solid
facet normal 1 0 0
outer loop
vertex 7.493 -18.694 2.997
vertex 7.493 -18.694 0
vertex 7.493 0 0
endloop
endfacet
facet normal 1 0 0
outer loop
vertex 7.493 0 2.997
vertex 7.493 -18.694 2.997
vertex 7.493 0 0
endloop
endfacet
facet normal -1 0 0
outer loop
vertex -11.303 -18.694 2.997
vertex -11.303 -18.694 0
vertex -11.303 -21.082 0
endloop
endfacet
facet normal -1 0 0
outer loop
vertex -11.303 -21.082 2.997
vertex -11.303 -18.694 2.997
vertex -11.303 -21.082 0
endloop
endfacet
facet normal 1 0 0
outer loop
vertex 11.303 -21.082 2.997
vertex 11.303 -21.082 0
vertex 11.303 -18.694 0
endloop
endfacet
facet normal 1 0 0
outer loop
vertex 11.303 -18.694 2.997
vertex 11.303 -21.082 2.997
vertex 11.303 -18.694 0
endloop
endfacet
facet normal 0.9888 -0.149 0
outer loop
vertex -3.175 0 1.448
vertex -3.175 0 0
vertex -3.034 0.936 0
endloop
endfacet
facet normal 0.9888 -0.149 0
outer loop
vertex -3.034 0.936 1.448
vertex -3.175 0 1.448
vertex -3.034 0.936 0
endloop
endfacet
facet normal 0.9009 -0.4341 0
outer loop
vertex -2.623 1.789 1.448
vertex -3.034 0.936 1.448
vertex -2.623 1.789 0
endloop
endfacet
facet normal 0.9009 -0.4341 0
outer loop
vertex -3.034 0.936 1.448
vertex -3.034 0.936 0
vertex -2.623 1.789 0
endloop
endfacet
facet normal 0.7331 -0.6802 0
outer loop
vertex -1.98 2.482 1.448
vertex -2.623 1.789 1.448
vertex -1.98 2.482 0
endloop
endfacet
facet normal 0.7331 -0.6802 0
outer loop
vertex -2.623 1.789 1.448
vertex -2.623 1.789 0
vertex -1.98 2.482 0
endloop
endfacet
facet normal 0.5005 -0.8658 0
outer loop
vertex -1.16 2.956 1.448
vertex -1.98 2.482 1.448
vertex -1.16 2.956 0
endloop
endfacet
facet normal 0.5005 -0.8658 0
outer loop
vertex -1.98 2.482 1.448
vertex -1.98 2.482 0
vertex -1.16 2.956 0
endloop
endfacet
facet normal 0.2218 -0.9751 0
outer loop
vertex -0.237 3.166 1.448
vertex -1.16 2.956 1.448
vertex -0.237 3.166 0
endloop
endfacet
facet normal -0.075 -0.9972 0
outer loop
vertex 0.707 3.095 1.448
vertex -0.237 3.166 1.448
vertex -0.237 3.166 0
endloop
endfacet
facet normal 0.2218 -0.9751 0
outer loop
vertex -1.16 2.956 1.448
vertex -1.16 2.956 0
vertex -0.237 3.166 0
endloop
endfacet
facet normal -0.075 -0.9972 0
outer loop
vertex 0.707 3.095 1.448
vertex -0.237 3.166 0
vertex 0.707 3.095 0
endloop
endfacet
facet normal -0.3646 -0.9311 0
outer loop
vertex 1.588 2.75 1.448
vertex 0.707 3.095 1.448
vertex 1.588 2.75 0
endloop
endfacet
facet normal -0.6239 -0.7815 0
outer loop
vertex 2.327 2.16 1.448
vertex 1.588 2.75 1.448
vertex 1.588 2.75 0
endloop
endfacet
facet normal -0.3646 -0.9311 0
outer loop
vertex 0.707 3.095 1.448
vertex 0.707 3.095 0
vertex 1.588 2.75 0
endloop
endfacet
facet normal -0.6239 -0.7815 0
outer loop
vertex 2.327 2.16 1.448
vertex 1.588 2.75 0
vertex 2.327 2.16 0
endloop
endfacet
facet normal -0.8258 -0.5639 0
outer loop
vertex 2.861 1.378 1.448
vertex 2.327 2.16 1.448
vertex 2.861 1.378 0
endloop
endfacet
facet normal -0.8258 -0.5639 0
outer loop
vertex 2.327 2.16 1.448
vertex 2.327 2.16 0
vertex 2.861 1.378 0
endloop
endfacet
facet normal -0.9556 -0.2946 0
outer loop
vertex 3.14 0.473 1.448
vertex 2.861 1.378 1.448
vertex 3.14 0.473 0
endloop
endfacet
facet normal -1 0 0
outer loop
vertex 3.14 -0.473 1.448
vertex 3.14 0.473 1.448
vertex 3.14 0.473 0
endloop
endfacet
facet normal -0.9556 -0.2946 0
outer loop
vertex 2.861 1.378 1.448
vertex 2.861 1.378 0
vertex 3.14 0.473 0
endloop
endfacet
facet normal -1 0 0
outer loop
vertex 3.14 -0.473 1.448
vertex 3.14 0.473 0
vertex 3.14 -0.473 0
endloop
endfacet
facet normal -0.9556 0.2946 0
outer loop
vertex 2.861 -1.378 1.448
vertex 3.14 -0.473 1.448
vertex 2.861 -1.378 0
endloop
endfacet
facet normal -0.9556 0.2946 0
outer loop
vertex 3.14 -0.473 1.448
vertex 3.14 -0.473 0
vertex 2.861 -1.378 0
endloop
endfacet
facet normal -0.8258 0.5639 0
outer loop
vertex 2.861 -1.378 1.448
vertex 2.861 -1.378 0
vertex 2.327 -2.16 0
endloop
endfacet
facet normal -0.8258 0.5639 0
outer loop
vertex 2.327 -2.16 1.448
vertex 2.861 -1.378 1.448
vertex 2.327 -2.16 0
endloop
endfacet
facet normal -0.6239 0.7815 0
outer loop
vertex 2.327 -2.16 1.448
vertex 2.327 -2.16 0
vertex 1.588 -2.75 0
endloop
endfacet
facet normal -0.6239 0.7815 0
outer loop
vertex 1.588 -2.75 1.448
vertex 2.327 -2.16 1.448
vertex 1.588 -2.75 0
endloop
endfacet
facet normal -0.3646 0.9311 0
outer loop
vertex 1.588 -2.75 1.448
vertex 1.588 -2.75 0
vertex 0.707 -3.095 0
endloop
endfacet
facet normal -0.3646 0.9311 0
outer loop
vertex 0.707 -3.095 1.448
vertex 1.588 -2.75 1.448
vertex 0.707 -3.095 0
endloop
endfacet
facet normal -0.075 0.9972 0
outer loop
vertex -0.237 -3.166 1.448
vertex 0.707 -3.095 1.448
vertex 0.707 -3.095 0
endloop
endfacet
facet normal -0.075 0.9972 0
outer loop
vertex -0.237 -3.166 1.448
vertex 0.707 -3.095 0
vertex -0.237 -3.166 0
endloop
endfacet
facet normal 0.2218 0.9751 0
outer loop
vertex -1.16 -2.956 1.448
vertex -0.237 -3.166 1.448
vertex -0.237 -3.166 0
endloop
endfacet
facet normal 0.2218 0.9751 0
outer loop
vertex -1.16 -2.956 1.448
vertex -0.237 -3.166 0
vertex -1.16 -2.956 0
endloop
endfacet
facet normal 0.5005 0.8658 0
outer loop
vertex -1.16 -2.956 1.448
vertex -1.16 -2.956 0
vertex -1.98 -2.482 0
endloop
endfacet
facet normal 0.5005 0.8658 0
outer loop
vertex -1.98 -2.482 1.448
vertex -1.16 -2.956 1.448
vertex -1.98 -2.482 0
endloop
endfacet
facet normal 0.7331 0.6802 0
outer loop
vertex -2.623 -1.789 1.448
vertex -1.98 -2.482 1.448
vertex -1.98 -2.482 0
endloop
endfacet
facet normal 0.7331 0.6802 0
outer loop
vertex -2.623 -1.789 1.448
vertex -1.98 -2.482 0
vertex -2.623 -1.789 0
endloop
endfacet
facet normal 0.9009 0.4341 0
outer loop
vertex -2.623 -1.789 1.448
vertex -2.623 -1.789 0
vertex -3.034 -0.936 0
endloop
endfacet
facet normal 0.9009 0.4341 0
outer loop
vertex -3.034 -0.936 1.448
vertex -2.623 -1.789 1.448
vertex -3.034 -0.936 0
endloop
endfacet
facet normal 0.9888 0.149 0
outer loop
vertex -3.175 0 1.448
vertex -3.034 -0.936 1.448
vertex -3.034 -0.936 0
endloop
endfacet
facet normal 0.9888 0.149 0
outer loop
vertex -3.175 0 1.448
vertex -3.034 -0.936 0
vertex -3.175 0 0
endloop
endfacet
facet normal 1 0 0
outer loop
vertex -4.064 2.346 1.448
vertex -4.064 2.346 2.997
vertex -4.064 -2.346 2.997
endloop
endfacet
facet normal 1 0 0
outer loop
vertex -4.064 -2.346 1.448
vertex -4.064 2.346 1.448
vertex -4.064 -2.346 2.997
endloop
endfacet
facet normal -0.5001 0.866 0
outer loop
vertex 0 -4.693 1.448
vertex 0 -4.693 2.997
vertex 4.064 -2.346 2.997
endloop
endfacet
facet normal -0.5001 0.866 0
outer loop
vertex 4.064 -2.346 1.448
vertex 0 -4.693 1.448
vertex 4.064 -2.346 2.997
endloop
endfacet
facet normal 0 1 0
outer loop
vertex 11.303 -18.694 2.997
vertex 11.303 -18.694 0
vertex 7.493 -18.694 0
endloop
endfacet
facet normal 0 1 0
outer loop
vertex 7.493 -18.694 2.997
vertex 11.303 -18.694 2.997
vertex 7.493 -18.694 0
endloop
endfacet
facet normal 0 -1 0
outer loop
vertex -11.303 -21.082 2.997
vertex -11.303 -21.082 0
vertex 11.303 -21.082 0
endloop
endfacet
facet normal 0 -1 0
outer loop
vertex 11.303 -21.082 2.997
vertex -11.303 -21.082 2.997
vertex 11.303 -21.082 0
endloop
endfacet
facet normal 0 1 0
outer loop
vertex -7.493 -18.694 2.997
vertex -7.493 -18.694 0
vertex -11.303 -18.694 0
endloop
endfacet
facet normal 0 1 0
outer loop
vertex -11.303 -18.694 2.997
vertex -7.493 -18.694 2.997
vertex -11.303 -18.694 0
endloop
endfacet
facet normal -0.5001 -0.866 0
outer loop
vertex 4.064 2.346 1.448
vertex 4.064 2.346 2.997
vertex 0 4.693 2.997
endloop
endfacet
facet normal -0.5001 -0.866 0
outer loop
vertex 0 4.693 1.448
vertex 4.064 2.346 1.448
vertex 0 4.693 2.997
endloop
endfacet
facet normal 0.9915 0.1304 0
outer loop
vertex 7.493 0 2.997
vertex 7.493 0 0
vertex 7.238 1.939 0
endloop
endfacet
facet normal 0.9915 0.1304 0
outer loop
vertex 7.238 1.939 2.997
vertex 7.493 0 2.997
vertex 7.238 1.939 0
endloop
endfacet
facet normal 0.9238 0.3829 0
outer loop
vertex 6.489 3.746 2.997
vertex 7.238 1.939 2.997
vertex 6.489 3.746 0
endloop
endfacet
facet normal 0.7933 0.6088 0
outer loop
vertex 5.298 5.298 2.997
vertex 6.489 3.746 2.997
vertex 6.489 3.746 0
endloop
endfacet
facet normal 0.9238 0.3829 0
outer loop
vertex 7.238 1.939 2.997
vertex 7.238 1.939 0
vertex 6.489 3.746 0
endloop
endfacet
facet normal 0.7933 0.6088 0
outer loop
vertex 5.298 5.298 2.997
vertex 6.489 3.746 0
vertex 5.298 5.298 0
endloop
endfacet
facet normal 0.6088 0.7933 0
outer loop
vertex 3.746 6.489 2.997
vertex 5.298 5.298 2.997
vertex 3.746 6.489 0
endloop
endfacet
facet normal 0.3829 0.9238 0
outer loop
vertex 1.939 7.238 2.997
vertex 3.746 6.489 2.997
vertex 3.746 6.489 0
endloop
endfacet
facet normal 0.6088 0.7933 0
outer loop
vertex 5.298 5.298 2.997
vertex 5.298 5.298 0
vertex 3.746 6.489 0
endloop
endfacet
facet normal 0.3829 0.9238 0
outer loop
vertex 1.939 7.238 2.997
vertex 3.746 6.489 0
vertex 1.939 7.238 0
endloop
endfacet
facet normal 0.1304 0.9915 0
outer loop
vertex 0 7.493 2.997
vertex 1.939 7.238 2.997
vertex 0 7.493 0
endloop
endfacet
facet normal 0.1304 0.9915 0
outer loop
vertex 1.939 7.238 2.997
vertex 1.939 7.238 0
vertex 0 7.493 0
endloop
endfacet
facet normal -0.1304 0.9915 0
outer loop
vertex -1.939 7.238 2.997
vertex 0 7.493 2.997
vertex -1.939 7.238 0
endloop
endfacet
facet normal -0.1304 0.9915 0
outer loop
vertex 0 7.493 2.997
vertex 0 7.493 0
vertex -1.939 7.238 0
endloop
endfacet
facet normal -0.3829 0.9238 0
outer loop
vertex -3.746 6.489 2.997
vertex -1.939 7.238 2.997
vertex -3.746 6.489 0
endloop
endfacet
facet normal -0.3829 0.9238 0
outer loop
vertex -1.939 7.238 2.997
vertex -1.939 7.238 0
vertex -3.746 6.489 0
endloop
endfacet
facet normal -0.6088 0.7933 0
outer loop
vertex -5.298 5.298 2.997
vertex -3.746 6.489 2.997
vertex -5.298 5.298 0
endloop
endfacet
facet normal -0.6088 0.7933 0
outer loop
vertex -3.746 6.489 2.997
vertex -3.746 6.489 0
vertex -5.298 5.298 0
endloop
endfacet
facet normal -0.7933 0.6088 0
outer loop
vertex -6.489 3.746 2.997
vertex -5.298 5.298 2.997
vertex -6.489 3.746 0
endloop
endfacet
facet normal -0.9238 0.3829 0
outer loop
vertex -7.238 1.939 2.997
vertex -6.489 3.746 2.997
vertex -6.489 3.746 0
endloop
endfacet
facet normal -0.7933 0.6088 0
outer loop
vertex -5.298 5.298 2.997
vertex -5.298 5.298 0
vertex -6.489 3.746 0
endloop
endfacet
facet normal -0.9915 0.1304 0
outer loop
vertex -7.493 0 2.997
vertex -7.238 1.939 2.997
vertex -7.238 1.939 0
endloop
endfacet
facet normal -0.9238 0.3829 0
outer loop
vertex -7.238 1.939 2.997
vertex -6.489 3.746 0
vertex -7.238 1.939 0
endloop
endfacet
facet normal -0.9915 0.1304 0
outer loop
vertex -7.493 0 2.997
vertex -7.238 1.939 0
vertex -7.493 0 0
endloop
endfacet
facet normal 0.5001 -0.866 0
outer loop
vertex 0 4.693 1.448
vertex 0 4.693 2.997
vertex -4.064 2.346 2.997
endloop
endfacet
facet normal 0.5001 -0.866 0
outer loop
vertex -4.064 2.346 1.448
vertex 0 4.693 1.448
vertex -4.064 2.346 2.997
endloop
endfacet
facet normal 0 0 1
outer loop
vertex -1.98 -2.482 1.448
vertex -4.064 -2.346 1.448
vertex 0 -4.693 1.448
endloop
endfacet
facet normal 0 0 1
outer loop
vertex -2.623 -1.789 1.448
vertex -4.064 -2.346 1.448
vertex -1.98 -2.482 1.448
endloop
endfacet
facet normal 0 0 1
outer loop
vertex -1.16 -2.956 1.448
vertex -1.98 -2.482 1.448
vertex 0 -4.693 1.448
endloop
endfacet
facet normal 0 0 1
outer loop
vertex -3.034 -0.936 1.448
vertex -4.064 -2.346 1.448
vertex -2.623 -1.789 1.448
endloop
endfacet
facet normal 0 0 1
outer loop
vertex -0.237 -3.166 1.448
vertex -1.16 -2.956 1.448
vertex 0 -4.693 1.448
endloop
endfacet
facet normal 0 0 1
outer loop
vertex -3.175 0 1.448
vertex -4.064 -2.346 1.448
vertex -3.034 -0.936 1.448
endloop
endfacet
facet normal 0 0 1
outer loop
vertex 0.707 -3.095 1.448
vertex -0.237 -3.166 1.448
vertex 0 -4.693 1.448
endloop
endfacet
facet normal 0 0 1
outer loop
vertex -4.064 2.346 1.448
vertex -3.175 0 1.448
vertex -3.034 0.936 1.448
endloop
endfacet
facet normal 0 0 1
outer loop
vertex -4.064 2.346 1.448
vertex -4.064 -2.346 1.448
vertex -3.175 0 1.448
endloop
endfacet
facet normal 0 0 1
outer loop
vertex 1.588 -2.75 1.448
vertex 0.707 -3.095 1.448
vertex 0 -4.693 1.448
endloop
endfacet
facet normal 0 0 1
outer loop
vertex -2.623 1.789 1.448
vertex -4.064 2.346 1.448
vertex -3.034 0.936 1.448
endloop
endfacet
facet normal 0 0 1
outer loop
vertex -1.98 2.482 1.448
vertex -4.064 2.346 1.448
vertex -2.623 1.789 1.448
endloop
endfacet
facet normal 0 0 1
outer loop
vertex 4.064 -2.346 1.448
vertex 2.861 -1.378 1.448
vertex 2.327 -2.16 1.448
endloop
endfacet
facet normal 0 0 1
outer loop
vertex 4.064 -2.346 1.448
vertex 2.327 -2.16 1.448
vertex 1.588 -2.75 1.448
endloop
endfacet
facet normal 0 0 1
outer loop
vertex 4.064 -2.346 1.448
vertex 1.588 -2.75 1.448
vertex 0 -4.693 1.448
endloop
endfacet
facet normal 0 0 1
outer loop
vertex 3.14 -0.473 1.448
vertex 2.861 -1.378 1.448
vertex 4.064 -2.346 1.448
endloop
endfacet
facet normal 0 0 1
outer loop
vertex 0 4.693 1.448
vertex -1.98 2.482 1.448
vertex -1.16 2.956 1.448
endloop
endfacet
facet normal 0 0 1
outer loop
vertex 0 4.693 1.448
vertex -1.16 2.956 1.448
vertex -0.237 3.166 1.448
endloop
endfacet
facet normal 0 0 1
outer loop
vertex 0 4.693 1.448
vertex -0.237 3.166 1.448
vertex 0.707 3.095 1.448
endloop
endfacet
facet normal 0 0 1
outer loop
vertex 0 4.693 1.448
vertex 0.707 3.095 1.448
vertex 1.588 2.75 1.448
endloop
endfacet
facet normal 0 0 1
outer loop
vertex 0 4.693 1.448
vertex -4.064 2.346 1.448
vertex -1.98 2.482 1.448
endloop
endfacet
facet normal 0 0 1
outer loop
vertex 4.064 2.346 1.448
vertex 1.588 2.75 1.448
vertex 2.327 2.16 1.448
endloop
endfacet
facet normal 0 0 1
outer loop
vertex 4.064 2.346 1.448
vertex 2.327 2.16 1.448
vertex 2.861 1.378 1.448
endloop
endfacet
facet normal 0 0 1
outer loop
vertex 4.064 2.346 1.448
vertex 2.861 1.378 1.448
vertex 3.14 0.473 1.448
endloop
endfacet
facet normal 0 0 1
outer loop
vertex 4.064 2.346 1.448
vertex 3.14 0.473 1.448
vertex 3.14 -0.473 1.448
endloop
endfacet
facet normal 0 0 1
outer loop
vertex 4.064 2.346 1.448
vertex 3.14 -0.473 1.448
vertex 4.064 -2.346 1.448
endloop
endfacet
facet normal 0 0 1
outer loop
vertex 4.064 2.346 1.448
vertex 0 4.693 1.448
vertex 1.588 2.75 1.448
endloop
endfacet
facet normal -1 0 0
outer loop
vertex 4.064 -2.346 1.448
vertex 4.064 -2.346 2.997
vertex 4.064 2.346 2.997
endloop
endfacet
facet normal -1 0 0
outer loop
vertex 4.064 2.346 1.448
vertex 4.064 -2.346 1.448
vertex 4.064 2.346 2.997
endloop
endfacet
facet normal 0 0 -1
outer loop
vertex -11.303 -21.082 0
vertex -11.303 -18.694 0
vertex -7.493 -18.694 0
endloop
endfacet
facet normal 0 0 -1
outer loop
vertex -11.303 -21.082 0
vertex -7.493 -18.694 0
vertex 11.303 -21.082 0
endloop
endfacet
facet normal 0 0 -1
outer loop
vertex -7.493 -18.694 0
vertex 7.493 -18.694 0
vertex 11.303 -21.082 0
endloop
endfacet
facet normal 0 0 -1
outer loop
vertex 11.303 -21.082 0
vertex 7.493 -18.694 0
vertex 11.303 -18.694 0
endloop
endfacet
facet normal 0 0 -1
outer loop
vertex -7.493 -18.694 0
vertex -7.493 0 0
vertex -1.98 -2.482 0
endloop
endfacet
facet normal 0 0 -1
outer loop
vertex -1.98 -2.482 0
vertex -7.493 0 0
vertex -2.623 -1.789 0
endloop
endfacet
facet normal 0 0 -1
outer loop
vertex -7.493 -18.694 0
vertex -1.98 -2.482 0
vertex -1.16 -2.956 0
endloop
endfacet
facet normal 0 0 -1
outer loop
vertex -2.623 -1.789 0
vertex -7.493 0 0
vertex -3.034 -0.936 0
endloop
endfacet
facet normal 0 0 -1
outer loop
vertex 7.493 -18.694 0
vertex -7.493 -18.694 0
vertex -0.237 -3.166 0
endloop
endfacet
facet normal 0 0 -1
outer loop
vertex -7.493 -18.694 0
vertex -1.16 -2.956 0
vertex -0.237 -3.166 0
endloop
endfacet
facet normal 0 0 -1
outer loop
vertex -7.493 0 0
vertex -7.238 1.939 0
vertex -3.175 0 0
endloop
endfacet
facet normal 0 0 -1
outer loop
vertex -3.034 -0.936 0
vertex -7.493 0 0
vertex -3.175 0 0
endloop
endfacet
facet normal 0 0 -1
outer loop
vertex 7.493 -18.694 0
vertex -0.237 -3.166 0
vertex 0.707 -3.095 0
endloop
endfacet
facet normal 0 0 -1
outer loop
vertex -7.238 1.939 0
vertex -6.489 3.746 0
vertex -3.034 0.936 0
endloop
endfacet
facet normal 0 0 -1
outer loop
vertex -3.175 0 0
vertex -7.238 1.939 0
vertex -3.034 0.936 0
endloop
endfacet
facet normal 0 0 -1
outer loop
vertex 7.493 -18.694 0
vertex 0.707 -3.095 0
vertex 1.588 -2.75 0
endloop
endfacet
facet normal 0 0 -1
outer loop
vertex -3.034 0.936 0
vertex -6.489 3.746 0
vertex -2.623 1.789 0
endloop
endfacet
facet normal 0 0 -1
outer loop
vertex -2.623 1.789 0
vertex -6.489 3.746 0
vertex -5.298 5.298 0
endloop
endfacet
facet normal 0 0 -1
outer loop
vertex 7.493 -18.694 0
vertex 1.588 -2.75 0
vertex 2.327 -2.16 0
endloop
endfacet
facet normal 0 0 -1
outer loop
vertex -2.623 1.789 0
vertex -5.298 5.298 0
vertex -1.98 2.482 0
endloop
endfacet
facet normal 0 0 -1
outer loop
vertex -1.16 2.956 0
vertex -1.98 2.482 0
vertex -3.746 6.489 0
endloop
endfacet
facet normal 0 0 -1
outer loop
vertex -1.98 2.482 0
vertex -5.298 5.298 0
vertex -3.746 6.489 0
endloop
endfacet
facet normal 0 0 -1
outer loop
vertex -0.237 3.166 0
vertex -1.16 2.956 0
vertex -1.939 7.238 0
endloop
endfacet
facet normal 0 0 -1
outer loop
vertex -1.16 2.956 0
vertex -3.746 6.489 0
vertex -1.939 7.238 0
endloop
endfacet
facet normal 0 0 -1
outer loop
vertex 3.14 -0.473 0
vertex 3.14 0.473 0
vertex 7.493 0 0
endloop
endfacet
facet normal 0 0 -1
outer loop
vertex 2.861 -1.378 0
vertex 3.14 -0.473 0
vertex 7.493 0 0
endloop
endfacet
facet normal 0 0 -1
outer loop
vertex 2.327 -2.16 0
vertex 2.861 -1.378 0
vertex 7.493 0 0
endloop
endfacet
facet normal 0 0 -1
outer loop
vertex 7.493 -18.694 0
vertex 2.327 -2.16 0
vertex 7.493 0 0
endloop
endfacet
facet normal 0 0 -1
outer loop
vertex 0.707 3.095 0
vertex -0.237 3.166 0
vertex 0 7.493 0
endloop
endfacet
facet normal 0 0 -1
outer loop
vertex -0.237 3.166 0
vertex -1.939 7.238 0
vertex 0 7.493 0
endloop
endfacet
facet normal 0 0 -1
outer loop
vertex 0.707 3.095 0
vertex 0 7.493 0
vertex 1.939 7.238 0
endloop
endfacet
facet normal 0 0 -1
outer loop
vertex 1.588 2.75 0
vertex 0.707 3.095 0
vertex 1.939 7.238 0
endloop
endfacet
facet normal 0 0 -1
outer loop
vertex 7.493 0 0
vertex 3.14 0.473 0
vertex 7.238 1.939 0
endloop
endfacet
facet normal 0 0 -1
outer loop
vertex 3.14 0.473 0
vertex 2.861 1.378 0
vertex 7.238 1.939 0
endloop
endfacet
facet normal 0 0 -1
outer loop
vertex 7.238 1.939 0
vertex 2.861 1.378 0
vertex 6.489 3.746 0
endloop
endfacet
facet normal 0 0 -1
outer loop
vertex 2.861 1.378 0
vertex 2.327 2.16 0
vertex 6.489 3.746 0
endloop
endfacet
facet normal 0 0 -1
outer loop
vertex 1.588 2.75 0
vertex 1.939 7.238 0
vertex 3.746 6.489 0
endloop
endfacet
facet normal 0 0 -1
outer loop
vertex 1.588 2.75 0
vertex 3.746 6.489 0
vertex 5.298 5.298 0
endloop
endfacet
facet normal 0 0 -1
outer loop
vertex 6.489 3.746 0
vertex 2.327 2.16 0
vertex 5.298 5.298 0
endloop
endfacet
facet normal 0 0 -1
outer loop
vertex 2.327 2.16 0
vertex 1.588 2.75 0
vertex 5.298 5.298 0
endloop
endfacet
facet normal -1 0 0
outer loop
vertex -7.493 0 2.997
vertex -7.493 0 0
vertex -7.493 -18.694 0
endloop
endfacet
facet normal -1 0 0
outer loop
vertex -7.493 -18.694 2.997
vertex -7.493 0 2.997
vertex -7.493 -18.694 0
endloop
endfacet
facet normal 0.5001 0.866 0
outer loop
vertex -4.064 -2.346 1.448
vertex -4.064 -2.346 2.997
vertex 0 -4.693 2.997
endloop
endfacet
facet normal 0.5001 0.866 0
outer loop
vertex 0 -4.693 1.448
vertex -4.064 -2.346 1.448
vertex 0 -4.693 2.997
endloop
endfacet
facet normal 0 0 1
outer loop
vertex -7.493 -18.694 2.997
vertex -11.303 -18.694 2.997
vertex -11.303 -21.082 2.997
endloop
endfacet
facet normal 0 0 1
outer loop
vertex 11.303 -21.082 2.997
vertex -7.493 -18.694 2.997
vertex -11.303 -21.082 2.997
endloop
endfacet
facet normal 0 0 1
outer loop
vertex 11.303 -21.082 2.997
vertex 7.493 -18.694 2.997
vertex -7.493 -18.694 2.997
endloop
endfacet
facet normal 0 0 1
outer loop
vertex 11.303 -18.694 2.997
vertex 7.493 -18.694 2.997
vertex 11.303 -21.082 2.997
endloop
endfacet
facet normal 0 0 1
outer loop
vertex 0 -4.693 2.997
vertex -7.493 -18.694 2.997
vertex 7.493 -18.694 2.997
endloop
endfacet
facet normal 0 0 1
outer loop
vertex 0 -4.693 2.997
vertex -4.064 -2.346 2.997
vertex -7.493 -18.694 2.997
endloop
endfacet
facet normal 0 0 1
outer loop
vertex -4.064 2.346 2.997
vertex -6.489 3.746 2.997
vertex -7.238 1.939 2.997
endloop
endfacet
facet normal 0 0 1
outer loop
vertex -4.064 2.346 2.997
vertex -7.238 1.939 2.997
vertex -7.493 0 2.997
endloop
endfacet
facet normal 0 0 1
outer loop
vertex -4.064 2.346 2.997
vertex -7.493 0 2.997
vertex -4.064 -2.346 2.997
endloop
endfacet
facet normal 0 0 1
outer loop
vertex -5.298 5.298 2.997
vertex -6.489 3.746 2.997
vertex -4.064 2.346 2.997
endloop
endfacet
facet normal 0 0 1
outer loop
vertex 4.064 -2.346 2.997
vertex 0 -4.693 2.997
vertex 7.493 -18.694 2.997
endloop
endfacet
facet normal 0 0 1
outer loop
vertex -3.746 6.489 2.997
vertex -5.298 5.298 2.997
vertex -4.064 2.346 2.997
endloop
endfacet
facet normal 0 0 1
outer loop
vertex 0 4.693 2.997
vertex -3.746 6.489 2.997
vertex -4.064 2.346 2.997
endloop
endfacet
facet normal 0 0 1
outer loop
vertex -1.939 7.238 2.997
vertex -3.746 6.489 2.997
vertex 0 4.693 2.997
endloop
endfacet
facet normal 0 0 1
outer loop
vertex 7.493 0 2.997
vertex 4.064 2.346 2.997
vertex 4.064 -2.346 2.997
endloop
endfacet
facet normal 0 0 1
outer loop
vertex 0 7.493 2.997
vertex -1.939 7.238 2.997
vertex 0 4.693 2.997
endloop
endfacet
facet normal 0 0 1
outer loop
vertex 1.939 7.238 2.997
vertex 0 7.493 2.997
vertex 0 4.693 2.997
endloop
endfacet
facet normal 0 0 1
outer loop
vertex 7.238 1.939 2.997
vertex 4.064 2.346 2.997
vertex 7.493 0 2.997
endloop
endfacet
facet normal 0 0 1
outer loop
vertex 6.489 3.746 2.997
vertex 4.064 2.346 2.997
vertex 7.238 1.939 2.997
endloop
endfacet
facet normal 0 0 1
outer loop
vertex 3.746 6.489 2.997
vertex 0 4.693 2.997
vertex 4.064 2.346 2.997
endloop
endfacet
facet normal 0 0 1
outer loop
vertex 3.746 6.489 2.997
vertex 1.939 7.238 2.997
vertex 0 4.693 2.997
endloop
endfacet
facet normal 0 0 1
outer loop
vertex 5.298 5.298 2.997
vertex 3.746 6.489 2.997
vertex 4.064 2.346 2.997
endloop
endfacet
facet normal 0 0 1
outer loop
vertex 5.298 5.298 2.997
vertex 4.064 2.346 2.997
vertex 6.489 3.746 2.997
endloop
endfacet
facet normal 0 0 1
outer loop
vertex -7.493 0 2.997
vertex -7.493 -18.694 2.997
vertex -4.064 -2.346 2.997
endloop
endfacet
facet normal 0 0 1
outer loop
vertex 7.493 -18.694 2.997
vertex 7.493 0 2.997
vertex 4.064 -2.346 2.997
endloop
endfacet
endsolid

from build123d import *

# Parameters (mm, degrees)
F1_DEPTH = 2.9972
F3_DEPTH = 1.5494


with BuildPart() as f1:
    # F0 (on Top) → F1 (new body)
    with BuildSketch(Plane.XY):
        with BuildLine():
            Line((-3.175, 0), (-7.493, 0))
            Line((-7.493, 0), (-7.493, -18.6944))
            Line((-7.493, -18.6944), (-11.303, -18.6944))
            Line((-11.303, -18.6944), (-11.303, -21.082))
            Line((-11.303, -21.082), (11.303, -21.082))
            Line((11.303, -21.082), (11.303, -18.6944))
            Line((11.303, -18.6944), (7.493, -18.6944))
            Line((7.493, -18.6944), (7.493, 0))
            Line((7.493, 0), (3.175, 0))
            ThreePointArc((3.175, 0), (0, -3.175), (-3.175, 0))
        make_face()
        with BuildLine():
            ThreePointArc((7.493, 0), (0, 7.493), (-7.493, 0))
            Line((-7.493, 0), (-3.175, 0))
            ThreePointArc((-3.175, 0), (0, 3.175), (3.175, 0))
            Line((3.175, 0), (7.493, 0))
        make_face()
    extrude(amount=F1_DEPTH)

    # F2 (on face) → F3 (cut)
    with BuildSketch(Plane.XY.offset(2.9972)):
        Polygon((0, 4.692703), (-4.064, 2.346351), (-4.064, -2.346351), (0, -4.692703), (4.064, -2.346351), (4.064, 2.346351), align=None)
    extrude(amount=-F3_DEPTH, mode=Mode.SUBTRACT)


solid = f1.part
